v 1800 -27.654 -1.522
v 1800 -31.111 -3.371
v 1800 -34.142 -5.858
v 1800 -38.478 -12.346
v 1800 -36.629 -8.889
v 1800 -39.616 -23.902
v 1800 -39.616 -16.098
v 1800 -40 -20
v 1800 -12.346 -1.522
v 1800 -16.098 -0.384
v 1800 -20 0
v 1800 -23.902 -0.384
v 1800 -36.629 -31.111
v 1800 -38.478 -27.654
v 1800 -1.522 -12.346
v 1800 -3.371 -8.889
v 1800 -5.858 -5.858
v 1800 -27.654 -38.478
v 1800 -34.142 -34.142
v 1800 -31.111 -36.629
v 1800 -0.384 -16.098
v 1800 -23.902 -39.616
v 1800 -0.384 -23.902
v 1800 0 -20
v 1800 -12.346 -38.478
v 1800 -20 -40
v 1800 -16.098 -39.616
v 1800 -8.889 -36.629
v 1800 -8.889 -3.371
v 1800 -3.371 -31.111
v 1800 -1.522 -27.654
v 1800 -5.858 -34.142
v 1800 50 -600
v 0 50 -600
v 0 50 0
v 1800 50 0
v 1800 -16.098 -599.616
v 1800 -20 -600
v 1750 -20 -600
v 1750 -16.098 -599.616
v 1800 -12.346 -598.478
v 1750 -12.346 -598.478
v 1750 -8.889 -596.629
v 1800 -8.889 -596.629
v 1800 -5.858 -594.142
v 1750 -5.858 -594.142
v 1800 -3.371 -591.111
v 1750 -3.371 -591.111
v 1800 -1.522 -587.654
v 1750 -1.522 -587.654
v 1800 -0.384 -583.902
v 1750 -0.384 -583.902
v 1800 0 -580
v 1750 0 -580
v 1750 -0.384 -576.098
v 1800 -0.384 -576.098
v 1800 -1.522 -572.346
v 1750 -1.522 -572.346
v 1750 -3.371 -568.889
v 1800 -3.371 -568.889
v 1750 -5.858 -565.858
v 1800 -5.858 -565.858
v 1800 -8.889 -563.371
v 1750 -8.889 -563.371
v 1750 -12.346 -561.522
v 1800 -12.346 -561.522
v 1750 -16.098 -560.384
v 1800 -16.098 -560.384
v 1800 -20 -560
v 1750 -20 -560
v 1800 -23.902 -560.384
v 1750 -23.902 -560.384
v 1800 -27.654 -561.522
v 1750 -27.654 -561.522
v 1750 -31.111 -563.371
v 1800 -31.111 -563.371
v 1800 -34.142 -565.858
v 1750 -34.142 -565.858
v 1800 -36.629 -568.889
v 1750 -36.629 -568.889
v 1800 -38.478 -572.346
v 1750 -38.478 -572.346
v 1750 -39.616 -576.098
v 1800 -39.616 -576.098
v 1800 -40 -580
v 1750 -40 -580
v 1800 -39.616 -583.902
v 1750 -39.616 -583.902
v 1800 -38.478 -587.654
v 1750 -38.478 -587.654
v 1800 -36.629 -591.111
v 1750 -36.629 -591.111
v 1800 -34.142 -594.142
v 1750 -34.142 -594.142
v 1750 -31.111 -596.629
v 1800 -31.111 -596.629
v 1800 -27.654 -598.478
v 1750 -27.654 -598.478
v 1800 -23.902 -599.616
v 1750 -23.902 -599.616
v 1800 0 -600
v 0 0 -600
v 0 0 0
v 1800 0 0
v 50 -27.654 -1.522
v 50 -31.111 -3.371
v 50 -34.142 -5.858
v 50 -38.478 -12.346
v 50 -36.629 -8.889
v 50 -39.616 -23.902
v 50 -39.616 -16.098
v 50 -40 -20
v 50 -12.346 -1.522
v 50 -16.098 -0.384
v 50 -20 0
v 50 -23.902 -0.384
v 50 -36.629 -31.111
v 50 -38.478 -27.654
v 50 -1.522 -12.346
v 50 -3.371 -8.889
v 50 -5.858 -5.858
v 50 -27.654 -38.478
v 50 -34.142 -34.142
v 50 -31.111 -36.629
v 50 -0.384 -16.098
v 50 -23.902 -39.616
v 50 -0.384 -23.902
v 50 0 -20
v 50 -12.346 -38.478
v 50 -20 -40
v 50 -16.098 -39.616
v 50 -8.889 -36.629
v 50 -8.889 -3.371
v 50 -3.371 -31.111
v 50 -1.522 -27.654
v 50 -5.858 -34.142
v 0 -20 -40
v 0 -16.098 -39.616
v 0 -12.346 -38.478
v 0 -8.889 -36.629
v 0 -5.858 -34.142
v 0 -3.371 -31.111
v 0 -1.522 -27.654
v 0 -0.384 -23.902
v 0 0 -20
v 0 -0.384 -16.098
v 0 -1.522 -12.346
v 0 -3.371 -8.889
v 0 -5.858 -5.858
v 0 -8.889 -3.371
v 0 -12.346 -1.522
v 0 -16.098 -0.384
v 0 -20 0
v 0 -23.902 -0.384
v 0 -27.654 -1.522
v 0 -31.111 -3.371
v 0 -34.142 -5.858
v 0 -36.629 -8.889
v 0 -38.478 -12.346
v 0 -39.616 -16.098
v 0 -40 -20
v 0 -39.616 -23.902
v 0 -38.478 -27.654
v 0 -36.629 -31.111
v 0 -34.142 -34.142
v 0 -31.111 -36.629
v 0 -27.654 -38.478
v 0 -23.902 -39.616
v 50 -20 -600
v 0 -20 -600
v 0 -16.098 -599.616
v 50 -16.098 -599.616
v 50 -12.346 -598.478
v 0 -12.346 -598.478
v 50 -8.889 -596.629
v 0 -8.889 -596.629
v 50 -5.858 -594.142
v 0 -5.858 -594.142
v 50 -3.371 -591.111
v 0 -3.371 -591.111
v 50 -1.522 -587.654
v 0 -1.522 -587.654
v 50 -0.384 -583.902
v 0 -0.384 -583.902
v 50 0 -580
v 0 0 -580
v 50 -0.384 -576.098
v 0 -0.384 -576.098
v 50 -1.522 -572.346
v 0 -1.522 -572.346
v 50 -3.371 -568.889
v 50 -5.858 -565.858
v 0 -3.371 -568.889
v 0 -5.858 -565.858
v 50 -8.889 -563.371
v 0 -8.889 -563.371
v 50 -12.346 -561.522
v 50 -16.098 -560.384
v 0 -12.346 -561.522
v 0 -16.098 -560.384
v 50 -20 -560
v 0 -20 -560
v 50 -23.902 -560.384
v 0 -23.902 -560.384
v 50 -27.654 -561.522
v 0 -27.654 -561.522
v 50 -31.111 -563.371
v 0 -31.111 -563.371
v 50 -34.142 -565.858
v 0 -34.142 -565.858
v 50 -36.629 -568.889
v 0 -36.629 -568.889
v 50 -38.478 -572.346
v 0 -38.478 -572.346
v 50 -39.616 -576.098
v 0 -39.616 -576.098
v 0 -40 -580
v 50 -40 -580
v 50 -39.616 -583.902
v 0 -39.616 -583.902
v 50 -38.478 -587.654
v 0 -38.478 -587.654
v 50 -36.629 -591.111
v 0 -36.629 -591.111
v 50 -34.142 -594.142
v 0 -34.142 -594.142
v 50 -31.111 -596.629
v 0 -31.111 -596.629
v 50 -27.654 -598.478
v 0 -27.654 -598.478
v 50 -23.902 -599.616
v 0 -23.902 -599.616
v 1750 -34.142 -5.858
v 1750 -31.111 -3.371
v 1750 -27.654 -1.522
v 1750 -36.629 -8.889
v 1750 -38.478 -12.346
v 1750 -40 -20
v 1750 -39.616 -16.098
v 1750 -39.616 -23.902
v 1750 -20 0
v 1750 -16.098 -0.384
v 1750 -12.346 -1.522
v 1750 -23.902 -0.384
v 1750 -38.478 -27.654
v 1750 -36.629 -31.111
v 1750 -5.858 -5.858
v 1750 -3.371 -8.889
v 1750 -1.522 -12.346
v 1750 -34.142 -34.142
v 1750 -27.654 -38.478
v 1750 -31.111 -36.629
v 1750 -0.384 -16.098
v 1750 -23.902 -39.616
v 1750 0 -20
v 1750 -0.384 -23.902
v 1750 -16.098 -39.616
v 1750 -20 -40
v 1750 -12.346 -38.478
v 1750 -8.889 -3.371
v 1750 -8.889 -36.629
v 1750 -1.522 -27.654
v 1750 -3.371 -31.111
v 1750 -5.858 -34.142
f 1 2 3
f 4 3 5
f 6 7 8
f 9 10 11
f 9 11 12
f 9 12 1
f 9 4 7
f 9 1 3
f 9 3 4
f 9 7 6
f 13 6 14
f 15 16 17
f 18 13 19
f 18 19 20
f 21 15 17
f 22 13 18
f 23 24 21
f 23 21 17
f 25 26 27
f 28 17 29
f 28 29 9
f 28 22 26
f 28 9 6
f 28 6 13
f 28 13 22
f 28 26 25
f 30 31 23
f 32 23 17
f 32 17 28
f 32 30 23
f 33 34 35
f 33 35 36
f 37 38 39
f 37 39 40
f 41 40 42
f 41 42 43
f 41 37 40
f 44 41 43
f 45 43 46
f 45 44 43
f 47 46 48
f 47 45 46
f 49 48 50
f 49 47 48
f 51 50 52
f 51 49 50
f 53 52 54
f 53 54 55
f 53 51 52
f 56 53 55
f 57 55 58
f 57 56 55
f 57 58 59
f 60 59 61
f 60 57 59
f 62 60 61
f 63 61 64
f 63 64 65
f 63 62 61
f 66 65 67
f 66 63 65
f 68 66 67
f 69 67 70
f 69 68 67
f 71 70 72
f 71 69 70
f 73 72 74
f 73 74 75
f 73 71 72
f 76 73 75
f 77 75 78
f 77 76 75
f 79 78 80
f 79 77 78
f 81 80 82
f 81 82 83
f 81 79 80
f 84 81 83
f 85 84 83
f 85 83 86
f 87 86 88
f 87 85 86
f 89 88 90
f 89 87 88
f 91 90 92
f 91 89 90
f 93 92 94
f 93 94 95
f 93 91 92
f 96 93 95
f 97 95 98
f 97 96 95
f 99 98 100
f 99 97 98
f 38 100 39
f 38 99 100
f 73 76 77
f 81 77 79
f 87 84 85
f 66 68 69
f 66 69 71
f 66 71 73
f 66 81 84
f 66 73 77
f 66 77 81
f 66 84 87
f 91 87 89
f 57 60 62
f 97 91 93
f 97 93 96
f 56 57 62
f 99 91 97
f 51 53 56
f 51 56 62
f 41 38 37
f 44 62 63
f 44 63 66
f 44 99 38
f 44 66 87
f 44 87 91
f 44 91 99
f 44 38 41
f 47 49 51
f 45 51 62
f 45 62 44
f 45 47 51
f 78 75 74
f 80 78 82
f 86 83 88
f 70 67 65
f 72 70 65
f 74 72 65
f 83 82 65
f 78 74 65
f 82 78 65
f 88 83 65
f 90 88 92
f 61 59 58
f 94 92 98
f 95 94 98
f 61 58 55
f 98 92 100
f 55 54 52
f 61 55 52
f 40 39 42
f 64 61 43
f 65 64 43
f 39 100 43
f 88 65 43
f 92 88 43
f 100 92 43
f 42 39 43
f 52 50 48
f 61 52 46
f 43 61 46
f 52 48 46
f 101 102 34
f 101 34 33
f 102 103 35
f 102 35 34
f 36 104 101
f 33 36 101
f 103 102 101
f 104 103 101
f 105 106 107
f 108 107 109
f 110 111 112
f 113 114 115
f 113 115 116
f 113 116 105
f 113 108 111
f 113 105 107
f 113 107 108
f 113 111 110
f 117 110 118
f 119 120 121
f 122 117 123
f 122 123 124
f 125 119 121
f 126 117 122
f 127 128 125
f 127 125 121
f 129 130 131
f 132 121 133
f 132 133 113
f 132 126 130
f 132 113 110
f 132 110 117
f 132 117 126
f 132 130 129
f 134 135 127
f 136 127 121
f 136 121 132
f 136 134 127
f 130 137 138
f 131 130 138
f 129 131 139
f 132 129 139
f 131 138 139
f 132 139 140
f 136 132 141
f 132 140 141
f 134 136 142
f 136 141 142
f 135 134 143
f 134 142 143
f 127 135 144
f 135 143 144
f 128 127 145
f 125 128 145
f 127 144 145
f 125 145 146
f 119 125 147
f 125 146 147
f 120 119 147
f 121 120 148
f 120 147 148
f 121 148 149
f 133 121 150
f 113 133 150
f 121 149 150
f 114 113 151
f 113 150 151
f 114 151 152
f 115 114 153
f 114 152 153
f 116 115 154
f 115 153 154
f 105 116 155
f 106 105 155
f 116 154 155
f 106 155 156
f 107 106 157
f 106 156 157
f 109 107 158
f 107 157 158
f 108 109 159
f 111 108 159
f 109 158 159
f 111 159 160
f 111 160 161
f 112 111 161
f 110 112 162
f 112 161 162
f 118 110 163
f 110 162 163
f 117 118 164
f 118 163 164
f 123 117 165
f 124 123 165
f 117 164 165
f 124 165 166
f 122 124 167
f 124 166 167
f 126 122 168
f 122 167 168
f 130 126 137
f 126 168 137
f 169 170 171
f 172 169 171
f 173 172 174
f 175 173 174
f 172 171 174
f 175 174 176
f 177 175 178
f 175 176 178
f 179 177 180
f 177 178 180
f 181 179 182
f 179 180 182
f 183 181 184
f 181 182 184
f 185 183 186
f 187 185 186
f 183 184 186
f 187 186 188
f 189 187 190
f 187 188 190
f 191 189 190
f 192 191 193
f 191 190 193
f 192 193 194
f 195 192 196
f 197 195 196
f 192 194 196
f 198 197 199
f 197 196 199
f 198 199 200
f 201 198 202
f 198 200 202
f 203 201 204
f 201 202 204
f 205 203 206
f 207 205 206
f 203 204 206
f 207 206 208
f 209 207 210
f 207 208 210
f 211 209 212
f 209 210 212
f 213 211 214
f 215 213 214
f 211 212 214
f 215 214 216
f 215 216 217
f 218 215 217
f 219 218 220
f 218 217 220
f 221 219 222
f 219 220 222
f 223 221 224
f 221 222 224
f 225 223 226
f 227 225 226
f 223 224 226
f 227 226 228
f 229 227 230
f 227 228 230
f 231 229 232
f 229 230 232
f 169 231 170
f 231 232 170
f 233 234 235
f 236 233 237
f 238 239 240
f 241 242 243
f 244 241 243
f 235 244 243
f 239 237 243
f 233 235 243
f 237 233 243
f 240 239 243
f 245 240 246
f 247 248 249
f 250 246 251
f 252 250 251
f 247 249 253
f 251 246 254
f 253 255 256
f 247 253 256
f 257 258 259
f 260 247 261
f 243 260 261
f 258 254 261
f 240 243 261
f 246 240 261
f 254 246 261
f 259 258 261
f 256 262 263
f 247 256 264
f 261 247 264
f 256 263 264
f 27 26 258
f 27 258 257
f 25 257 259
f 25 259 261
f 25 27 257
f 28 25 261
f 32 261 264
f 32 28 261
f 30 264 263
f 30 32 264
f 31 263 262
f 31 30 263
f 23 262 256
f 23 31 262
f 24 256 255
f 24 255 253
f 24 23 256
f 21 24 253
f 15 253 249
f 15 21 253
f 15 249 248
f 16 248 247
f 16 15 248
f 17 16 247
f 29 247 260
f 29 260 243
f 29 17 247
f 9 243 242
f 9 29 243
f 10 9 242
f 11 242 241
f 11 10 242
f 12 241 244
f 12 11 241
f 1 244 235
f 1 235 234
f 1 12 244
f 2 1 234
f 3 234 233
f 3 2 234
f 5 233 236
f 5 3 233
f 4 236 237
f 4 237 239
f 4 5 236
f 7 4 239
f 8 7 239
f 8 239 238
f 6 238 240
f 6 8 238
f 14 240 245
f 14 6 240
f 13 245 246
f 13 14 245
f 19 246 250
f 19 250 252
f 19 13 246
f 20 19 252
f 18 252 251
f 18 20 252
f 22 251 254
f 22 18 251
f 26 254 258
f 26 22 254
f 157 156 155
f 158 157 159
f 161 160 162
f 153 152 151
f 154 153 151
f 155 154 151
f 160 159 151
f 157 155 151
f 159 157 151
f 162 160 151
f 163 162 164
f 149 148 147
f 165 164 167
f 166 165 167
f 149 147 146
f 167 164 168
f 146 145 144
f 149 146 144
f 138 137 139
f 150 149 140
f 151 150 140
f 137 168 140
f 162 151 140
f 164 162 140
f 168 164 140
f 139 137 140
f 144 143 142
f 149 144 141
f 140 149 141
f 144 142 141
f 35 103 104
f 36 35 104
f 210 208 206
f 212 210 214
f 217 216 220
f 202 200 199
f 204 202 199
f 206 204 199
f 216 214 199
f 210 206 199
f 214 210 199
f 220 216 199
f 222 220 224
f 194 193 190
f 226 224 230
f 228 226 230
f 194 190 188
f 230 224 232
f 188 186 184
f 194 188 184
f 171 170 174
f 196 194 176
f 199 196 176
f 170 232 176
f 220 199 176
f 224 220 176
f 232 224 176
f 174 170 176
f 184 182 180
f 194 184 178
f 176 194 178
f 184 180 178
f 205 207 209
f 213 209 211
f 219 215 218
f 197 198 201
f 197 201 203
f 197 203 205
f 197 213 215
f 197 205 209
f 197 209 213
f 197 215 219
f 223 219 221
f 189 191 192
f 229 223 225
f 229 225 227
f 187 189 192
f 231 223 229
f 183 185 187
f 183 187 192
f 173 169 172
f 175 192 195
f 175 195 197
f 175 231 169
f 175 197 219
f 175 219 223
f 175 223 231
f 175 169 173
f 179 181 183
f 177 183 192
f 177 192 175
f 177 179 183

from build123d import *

# Parameters (mm, degrees)
SKETCH_5_W        = 1800
SKETCH_5_H        = 600
EXTRUDE_4_DEPTH   = 50
SKETCH_6_R        = 20
EXTRUDE_5_DEPTH   = 50
EXTRUDE_5_2_DEPTH = 50
SKETCH_7_R        = 20
EXTRUDE_6_DEPTH   = 50
EXTRUDE_6_2_DEPTH = 50


with BuildPart() as part:
    # 草图5 → 凸台-拉伸4 (new body)
    with BuildSketch(Plane(origin=(0, 0, 0), x_dir=(1, 0, 0), z_dir=(0, 1, 0))):
        with Locations((900, 300)):
            Rectangle(SKETCH_5_W, SKETCH_5_H)
    extrude(amount=EXTRUDE_4_DEPTH)


with BuildPart() as body_2:
    # 草图6 → 凸台-拉伸5 (new body)
    with BuildSketch(Plane(origin=(0, 0, 0), x_dir=(0, 0, -1), z_dir=(1, 0, 0))):
        with Locations((20, -20)):
            Circle(SKETCH_6_R)
    extrude(amount=EXTRUDE_5_DEPTH)


with BuildPart() as body_3:
    # 草图6 → Extrude 5 2 (new body)
    with BuildSketch(Plane(origin=(0, 0, 0), x_dir=(0, 0, -1), z_dir=(1, 0, 0))):
        with Locations((580, -20)):
            Circle(SKETCH_6_R)
    extrude(amount=EXTRUDE_5_2_DEPTH)


with BuildPart() as body_4:
    # 草图7 → 凸台-拉伸6 (new body)
    with BuildSketch(Plane(origin=(1800, 0, 0), x_dir=(0, 0, -1), z_dir=(1, 0, 0))):
        with Locations((20, -20)):
            Circle(SKETCH_7_R)
    extrude(amount=-EXTRUDE_6_DEPTH)


with BuildPart() as body_5:
    # 草图7 → Extrude 6 2 (new body)
    with BuildSketch(Plane(origin=(1800, 0, 0), x_dir=(0, 0, -1), z_dir=(1, 0, 0))):
        with Locations((580, -20)):
            Circle(SKETCH_7_R)
    extrude(amount=-EXTRUDE_6_2_DEPTH)


solid = Compound([part.part, body_2.part, body_3.part, body_4.part, body_5.part])
